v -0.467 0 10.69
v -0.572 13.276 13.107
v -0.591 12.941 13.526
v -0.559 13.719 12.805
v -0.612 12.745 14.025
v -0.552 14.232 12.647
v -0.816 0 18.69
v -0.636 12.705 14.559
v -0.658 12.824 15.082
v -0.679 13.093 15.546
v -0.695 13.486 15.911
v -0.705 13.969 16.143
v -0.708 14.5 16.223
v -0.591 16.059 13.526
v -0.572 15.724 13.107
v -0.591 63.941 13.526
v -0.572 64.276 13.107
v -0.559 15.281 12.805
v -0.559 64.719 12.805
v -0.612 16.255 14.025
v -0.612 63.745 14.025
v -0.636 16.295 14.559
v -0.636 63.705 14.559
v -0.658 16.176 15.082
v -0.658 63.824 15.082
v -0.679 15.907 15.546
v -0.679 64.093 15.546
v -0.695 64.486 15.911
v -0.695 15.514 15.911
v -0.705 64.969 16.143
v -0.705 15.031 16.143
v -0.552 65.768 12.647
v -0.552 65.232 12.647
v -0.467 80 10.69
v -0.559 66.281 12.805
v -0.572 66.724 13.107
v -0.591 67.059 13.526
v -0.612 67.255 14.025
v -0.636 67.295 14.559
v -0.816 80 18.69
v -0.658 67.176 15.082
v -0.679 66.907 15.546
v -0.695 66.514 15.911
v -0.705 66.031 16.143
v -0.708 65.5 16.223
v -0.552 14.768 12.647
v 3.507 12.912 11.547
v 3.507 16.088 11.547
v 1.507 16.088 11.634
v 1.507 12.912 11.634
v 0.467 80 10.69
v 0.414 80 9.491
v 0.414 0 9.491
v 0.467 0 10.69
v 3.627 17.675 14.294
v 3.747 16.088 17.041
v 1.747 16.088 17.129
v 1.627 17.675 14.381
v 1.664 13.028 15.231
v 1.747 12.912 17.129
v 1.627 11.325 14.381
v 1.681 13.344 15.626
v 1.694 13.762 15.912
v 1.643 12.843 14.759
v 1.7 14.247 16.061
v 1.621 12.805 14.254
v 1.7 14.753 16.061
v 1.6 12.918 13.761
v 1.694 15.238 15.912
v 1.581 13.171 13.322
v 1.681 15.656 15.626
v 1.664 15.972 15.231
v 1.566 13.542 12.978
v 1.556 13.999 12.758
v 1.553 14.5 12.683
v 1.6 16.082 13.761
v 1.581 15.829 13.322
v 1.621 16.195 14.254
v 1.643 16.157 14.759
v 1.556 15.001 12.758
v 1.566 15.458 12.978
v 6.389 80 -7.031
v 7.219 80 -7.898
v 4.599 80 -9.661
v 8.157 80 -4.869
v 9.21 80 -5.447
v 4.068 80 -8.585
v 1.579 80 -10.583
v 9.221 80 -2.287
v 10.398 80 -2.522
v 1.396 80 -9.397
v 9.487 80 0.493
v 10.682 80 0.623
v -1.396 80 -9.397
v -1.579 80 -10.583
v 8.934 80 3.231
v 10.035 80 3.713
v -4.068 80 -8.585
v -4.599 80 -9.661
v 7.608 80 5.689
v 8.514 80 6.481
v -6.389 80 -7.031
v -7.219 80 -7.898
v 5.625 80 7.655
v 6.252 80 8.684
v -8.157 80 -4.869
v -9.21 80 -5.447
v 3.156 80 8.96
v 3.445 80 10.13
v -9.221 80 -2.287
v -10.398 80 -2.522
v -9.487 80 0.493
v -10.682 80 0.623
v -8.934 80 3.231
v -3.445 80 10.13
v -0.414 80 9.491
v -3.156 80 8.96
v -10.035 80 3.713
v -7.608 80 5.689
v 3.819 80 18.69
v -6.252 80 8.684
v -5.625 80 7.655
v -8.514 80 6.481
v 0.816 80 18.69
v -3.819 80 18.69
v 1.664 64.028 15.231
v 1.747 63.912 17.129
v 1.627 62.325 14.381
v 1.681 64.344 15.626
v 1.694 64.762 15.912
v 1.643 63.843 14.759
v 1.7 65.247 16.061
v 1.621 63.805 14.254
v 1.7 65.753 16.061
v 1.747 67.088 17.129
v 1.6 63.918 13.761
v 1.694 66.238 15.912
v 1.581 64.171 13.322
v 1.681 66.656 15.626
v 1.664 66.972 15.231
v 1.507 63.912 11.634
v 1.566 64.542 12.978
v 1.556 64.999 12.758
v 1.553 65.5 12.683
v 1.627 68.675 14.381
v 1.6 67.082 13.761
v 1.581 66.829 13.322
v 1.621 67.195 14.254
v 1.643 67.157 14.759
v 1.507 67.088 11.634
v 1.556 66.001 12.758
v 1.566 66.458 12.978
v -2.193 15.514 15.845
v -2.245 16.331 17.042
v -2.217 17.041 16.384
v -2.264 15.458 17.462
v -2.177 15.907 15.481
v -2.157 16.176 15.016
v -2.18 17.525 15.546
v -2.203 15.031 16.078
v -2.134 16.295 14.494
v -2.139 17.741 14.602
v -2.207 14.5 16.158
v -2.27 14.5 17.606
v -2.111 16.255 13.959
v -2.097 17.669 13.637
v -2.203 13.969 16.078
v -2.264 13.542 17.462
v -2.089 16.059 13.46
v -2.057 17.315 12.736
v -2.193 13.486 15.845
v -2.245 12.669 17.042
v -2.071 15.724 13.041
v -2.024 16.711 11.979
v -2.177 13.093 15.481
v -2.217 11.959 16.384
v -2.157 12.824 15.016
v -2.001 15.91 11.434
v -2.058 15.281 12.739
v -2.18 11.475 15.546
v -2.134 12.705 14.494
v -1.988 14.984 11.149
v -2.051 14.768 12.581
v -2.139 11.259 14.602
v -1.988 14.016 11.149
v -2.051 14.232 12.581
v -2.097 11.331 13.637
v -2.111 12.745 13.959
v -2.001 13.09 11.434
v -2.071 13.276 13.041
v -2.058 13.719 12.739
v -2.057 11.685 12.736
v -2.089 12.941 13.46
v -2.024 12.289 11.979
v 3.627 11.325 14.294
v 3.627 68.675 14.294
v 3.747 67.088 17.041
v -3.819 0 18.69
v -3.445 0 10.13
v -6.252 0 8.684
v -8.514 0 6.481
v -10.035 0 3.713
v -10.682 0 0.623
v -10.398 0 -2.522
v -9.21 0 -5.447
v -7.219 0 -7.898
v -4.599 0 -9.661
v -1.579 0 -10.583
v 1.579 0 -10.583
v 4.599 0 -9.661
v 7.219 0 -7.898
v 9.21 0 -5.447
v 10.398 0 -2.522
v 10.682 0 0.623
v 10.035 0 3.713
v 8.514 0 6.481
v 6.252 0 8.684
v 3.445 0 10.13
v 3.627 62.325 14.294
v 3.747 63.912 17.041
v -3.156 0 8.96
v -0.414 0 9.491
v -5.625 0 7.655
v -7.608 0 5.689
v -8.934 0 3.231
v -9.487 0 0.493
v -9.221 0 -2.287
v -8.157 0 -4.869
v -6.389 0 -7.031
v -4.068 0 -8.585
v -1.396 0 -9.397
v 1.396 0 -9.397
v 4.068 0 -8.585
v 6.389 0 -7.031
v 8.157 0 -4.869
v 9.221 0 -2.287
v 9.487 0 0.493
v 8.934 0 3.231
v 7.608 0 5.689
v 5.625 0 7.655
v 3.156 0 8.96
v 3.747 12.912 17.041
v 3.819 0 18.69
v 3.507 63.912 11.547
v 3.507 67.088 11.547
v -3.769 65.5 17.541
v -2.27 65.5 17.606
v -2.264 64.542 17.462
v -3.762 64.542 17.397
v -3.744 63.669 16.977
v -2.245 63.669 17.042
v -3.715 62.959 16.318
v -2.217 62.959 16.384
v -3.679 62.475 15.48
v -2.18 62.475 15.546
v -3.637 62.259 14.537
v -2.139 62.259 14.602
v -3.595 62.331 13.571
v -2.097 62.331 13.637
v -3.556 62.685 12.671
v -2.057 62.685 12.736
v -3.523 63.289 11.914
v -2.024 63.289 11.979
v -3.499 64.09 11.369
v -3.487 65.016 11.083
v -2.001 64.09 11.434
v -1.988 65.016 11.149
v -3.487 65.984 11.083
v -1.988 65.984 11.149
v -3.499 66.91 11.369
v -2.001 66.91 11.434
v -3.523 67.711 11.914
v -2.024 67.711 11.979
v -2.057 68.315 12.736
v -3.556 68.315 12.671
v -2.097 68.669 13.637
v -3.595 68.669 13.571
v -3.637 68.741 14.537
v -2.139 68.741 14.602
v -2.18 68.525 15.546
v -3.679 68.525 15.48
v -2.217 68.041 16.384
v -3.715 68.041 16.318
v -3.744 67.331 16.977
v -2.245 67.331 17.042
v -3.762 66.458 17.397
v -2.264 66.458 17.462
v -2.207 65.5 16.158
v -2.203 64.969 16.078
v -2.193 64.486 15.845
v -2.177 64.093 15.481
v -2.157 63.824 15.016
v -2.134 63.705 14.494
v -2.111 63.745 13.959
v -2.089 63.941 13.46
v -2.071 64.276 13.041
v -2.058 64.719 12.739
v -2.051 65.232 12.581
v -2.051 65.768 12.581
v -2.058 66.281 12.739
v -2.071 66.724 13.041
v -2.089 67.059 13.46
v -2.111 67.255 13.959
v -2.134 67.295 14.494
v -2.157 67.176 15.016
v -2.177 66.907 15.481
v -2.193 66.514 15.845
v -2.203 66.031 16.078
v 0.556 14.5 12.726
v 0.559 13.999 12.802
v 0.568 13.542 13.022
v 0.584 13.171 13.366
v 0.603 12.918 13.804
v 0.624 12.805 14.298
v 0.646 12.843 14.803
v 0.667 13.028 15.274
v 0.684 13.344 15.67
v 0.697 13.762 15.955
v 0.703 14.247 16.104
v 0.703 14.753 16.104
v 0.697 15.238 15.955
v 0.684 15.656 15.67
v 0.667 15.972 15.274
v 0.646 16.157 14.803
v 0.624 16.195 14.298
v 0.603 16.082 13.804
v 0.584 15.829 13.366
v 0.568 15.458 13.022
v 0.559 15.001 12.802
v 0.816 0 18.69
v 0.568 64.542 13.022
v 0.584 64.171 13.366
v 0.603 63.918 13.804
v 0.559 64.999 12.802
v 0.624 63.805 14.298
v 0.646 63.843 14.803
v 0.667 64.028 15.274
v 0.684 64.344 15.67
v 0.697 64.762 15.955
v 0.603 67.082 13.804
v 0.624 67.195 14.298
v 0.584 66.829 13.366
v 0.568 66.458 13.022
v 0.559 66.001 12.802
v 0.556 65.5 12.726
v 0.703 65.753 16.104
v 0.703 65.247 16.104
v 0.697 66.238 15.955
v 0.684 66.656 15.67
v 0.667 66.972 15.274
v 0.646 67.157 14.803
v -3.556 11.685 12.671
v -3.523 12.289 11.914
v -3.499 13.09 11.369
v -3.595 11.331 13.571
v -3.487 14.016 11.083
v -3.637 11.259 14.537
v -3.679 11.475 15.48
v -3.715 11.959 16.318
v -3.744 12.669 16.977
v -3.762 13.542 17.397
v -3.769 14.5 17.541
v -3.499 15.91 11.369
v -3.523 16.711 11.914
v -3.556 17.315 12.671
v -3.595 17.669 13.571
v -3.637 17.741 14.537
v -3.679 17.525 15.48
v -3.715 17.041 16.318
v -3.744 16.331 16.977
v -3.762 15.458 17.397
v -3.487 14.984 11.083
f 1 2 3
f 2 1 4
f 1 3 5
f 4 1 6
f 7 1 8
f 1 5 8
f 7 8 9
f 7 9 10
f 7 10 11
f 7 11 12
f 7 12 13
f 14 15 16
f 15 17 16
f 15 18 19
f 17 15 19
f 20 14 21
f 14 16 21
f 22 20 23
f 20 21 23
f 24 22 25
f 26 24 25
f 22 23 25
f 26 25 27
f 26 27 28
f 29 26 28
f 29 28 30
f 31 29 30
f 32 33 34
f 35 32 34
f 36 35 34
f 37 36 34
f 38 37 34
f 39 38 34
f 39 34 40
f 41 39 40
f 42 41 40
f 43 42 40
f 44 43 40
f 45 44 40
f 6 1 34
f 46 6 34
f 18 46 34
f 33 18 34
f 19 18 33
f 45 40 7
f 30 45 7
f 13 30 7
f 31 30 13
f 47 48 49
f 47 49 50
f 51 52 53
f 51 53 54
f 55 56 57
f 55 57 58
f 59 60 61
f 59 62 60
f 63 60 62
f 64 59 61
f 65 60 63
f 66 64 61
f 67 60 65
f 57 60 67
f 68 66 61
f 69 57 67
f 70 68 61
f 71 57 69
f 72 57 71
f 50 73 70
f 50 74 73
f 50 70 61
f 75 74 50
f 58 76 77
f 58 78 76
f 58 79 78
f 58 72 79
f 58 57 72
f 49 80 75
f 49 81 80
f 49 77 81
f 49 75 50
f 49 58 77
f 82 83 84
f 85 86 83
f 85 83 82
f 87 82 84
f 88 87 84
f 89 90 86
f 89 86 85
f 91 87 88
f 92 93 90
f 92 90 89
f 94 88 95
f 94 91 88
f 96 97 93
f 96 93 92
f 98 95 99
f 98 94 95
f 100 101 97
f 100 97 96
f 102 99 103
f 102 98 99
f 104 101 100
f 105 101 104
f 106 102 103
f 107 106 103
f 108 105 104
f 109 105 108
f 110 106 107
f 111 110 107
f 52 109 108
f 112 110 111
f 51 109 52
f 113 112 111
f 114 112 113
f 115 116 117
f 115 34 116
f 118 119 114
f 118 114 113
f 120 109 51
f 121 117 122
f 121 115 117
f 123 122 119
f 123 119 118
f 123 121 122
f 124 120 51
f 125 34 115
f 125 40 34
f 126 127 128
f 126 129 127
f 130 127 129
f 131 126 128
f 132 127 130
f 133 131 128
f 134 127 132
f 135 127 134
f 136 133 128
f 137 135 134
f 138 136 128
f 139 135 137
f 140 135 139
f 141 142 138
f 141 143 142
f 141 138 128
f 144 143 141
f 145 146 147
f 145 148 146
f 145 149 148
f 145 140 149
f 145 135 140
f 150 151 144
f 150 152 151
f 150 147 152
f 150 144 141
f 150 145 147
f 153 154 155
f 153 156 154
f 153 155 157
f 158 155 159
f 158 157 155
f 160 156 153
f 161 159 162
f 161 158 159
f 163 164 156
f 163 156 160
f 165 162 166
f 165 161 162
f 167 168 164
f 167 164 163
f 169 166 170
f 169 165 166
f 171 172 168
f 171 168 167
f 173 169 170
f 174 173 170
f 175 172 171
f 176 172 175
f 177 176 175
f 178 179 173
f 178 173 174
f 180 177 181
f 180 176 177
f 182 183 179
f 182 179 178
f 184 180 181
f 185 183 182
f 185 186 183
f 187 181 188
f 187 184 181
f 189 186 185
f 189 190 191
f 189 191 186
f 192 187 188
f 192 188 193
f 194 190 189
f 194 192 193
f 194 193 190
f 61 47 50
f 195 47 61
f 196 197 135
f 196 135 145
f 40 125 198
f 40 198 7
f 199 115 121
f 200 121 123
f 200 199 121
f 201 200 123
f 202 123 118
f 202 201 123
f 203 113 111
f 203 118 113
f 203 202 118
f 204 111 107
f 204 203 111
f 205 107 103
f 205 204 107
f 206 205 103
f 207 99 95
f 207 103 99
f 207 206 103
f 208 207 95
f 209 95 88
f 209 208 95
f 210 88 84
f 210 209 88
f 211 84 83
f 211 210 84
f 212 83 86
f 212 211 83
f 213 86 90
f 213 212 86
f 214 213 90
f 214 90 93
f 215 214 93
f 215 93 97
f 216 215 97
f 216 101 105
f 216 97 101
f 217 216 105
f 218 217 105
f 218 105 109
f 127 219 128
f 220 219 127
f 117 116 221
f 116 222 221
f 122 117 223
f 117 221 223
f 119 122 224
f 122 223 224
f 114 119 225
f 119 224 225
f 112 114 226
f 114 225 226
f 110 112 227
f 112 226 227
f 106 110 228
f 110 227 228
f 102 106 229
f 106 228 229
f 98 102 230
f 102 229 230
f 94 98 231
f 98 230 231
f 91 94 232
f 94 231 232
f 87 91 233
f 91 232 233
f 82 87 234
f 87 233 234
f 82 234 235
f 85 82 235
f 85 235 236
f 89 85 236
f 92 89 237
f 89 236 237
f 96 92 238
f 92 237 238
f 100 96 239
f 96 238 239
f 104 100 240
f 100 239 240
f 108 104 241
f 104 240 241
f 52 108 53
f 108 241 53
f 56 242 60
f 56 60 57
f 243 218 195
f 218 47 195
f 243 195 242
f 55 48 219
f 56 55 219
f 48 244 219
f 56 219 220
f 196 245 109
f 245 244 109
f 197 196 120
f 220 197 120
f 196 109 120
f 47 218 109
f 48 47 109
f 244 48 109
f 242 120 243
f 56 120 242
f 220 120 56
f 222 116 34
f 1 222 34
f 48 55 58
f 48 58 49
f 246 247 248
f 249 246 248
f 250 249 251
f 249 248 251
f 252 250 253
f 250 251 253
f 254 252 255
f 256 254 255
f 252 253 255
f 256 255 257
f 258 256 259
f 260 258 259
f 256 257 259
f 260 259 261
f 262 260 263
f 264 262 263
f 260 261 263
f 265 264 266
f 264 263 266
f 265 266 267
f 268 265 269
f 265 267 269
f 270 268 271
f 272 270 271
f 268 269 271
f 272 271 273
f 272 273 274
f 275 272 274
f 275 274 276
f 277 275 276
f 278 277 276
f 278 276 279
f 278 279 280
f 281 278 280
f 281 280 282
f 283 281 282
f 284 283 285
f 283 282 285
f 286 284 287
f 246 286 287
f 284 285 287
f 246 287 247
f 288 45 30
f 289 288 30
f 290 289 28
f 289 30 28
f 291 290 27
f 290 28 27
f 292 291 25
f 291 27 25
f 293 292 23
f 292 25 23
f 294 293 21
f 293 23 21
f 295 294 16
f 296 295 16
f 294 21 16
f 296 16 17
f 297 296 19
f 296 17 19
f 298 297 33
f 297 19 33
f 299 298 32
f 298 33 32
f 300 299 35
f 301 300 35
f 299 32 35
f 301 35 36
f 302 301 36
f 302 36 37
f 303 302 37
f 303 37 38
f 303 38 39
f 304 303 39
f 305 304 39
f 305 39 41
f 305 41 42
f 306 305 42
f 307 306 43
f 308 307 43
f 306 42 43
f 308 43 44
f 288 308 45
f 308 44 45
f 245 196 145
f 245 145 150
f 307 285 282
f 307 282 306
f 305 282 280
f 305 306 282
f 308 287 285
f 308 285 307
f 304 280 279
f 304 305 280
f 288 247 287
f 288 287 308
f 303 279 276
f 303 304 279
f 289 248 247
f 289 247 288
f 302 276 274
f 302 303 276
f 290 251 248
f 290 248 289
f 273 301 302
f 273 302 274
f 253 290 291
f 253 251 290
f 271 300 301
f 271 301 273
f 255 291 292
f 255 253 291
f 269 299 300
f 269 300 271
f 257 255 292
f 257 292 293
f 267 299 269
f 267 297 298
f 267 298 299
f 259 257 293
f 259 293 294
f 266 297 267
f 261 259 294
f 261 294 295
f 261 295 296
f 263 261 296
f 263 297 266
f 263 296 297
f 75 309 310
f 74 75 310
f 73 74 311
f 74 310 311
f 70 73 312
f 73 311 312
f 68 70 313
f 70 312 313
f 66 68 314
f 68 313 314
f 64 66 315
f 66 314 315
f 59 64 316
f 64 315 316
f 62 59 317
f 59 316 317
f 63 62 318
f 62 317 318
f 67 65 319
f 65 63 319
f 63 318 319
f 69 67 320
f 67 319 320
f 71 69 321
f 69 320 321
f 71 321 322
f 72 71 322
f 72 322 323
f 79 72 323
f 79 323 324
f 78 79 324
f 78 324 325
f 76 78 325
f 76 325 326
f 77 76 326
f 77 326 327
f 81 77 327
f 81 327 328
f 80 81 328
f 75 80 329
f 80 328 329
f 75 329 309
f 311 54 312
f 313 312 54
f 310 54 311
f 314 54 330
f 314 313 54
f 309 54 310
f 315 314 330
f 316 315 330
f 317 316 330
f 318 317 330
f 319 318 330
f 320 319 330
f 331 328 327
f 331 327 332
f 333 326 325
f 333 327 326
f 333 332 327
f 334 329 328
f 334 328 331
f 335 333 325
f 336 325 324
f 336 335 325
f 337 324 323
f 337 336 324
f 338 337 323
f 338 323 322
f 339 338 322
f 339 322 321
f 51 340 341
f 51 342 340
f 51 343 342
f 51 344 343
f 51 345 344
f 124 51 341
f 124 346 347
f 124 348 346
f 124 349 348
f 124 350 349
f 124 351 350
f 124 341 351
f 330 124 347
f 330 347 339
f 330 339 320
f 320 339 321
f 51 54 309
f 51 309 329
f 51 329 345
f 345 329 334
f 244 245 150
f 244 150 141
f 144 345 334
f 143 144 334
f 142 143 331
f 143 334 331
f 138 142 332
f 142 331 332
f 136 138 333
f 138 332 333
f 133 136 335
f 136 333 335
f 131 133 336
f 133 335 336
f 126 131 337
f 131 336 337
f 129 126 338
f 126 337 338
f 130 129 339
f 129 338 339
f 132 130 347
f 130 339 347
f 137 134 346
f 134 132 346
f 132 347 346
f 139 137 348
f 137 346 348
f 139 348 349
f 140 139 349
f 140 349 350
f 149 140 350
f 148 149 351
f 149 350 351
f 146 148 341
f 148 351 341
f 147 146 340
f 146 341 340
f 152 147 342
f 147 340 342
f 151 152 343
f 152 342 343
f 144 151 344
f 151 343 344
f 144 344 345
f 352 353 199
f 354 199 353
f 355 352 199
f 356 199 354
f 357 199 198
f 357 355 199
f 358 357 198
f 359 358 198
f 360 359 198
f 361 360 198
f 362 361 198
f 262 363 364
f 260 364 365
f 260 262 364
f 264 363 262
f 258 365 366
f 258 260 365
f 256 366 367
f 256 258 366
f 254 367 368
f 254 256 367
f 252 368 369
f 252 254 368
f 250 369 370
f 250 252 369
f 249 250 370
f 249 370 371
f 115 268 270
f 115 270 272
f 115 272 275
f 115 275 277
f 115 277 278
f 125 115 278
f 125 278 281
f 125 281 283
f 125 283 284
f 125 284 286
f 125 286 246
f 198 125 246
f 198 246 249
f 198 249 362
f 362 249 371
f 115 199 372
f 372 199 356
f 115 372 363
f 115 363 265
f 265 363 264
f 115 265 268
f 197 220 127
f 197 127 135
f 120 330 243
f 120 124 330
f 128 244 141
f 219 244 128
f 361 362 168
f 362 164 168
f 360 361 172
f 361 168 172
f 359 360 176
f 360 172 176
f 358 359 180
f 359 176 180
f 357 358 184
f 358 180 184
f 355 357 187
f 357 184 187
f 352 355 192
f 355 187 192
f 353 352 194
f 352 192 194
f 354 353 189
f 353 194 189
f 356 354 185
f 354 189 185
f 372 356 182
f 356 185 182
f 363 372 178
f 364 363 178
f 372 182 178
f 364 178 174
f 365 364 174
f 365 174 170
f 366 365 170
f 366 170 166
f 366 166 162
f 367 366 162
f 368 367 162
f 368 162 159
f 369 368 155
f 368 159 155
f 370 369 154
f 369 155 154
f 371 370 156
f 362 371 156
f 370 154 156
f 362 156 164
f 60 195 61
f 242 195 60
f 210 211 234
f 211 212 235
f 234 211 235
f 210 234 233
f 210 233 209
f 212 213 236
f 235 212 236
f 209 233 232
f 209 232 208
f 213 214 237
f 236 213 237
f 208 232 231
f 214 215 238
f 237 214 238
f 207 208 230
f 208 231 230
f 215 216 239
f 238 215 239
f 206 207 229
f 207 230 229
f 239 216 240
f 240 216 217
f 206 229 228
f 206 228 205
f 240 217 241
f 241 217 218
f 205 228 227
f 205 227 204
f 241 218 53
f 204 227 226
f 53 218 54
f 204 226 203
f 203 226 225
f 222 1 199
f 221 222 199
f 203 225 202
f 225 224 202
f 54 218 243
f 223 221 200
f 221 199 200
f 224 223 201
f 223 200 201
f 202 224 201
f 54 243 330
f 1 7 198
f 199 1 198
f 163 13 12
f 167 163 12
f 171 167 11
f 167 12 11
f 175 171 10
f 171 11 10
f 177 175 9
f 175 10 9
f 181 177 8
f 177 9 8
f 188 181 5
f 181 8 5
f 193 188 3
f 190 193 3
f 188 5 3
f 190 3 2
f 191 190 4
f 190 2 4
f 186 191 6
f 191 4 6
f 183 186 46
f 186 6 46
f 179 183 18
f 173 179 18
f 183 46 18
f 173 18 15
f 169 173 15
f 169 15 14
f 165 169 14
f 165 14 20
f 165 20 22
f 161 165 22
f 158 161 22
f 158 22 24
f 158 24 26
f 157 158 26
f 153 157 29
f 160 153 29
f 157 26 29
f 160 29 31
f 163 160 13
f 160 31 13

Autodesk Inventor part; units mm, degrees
ref_plane "YZ Plane" through (0, 0, 0) normal (1, 0, 0) x (0, 1, 0)
ref_plane "XZ Plane" through (0, 0, 0) normal (0, 1, 0) x (-1, 0, 0)
ref_plane "XY Plane" through (0, 0, 0) normal (0, 0, 1) x (1, 0, 0)
sketch "Sketch1" plane through (0, 0, 0) normal (0, 1, 0) x (-1, 0, 0)
  arc A0 (-0.4144, 9.491) -> (0.4144, 9.491) centre (0, 0) ccw
  arc A1 (-0.4667, 10.6898) -> (0.4667, 10.6898) centre (0, 0) ccw
  line L0 (0, 0) -> (-0.4667, 10.6898)
  line L1 (0, 0) -> (0.4667, 10.6898)
  line L2 (0, 0) -> (0, 8.5605) construction
  dimension "d0" = 19
  dimension "d1" = 21.4
  dimension "d2" = 5
  dimension "d3" = 2.5
extrude "BearingSleeve" add sketch "Sketch1" along normal blind 80 contours A0 L1 A1 L0
sketch "Sketch2" plane through (0, 80, 0) normal (0, 1, 0) x (1, 0, 0)
  arc A0 (0.4144, -9.491) -> (-0.4144, -9.491) centre (0, 0) ccw projected
  line L0 (-0.4144, -9.491) -> (-0.816, -18.6898)
  line L1 (0.4144, -9.491) -> (0.816, -18.6898)
  line L2 (-0.4667, -10.6898) -> (-0.4144, -9.491) projected
  line L3 (0.4144, -9.491) -> (0.4667, -10.6898) projected
  line L4 (3.3903, -8.8744) -> (3.8189, -18.6898)
  line L5 (-3.3903, -8.8744) -> (-3.8189, -18.6898)
  line L6 (-3.8189, -18.6898) -> (-0.816, -18.6898)
  line L7 (0.816, -18.6898) -> (3.8189, -18.6898)
  dimension "d6" = 3
  dimension "d7" = 3
  dimension "d8" = 8
  dimension "d9" = 8
extrude "BearingLocks" add sketch "Sketch2" against normal up to surface (80 mm away)
sketch "Sketch3" plane through (-3.4452, 0, 10.1302) normal (-0.9990482, 0, -0.0436194) x (-0.0436194, 0, 0.9990482)
  line L0 (8.5678, 0) -> (0, 0) projected
  line L1 (0, 80) -> (8.5678, 80) projected
  line L2 (8.5678, 80) -> (8.5678, 0) projected
  point P0 (-10.2708, 0)
  point P1 (4.1678, 14.5)
  point P2 (4.1678, 65.5)
  dimension "d12" = 14.5
  dimension "d13" = 14.5
  dimension "d14" = 4.4
  dimension "d15" = 4.4
hole "Hole1" at (-3.6269, 14.5, 14.294) at (-3.6269, 65.5, 14.294) direction (0.9990482, 0, 0.0436194) diameter 3.6 end up to surface counterbore diameter 6.5 counterbore depth 1.5 clearance for "Socket Head Cap Screw" size "M3" standard "Ansi Metric M Profile"
sketch "Sketch4" plane through (3.4452, 0, 10.1302) normal (0.9990482, 0, -0.0436194) x (-0.0436194, 0, -0.9990482)
  line L0 (-8.5678, 80) -> (0, 80) projected
  line L1 (0, 0) -> (-8.5678, 0) projected
  line L2 (-8.5678, 80) -> (-8.5678, 0) projected
  point P0 (10.2708, 0)
  point P1 (-4.1678, 65.5)
  point P2 (-4.1678, 14.5)
  dimension "d23" = 14.5
  dimension "d24" = 14.5
  dimension "d25" = 4.4
  dimension "d26" = 4.4
hole "Hole2" at (3.6269, 65.5, 14.294) at (3.6269, 14.5, 14.294) direction (-0.9990482, 0, 0.0436194) diameter 3.4 depth 3 clearance for "Socket Head Cap Screw" size "M3" standard "Ansi Metric M Profile"
sketch "Sketch5" plane through (3.4452, 0, 10.1302) normal (0.9990482, 0, -0.0436194) x (-0.0436194, 0, -0.9990482)
  circle A0 centre (-4.1678, 65.5) radius 1.7 projected
  circle A1 centre (-4.1678, 14.5) radius 1.7 projected
  line L0 (0, 80) -> (0, 0) projected
  line L1 (-8.5678, 80) -> (0, 80) projected
  line L2 (-8.5678, 80) -> (-8.5678, 0) projected
  line L3 (0, 0) -> (-8.5678, 0) projected
  line L4 (-1.4178, 12.9123) -> (-4.1678, 11.3246)
  line L5 (-4.1678, 11.3246) -> (-6.9178, 12.9123)
  line L6 (-6.9178, 12.9123) -> (-6.9178, 16.0877)
  line L7 (-6.9178, 16.0877) -> (-4.1678, 17.6754)
  line L8 (-4.1678, 17.6754) -> (-1.4178, 16.0877)
  line L9 (-1.4178, 16.0877) -> (-1.4178, 12.9123)
  line L10 (-1.4178, 63.9123) -> (-4.1678, 62.3246)
  line L11 (-4.1678, 62.3246) -> (-6.9178, 63.9123)
  line L12 (-6.9178, 63.9123) -> (-6.9178, 67.0877)
  line L13 (-6.9178, 67.0877) -> (-4.1678, 68.6754)
  line L14 (-4.1678, 68.6754) -> (-1.4178, 67.0877)
  line L15 (-1.4178, 67.0877) -> (-1.4178, 63.9123)
  point P0 (10.2708, 0)
  dimension "d34" = 5.5
  dimension "d35" = 5.5
extrude "Extrusion3" cut sketch "Sketch5" against normal blind 2 contours L4 L5 L6 L7 L8 L9 | L10 L11 L12 L13 L14 L15
equation "\"d0\" = BearingOD"
equation "\"d1\" = BearingOD + BearingClampWallThickness"
equation "\"d2\" = BearingTensionGap"
equation "\"d3\" = 0.5 * BearingTensionGap"
equation "\"d4\" = EffectiveBearingLength"
equation "\"d10\" = EffectiveBearingLength"
equation "\"d12\" = 0.5 * BearingLength"
equation "\"d13\" = 0.5 * BearingLength"
equation "\"d23\" = 0.5 * BearingLength"
equation "\"d24\" = 0.5 * BearingLength"
equation "\"BearingOD\" = 19"
equation "\"NozzleDiameter\" = 0.4"
equation "\"BearingTensionGap\" = 5deg"
equation "\"BearingLength\" = 29"
equation "\"EffectiveBearingLength\" = 80"
equation "\"BearingSpacing\" = EffectiveBearingLength - 2 * BearingLength"
equation "\"BearingClampWallThickness\" = 6 * NozzleDiameter"
equation "\"BearingClampLength\" = 8"
properties part number "X-Motor P1"
